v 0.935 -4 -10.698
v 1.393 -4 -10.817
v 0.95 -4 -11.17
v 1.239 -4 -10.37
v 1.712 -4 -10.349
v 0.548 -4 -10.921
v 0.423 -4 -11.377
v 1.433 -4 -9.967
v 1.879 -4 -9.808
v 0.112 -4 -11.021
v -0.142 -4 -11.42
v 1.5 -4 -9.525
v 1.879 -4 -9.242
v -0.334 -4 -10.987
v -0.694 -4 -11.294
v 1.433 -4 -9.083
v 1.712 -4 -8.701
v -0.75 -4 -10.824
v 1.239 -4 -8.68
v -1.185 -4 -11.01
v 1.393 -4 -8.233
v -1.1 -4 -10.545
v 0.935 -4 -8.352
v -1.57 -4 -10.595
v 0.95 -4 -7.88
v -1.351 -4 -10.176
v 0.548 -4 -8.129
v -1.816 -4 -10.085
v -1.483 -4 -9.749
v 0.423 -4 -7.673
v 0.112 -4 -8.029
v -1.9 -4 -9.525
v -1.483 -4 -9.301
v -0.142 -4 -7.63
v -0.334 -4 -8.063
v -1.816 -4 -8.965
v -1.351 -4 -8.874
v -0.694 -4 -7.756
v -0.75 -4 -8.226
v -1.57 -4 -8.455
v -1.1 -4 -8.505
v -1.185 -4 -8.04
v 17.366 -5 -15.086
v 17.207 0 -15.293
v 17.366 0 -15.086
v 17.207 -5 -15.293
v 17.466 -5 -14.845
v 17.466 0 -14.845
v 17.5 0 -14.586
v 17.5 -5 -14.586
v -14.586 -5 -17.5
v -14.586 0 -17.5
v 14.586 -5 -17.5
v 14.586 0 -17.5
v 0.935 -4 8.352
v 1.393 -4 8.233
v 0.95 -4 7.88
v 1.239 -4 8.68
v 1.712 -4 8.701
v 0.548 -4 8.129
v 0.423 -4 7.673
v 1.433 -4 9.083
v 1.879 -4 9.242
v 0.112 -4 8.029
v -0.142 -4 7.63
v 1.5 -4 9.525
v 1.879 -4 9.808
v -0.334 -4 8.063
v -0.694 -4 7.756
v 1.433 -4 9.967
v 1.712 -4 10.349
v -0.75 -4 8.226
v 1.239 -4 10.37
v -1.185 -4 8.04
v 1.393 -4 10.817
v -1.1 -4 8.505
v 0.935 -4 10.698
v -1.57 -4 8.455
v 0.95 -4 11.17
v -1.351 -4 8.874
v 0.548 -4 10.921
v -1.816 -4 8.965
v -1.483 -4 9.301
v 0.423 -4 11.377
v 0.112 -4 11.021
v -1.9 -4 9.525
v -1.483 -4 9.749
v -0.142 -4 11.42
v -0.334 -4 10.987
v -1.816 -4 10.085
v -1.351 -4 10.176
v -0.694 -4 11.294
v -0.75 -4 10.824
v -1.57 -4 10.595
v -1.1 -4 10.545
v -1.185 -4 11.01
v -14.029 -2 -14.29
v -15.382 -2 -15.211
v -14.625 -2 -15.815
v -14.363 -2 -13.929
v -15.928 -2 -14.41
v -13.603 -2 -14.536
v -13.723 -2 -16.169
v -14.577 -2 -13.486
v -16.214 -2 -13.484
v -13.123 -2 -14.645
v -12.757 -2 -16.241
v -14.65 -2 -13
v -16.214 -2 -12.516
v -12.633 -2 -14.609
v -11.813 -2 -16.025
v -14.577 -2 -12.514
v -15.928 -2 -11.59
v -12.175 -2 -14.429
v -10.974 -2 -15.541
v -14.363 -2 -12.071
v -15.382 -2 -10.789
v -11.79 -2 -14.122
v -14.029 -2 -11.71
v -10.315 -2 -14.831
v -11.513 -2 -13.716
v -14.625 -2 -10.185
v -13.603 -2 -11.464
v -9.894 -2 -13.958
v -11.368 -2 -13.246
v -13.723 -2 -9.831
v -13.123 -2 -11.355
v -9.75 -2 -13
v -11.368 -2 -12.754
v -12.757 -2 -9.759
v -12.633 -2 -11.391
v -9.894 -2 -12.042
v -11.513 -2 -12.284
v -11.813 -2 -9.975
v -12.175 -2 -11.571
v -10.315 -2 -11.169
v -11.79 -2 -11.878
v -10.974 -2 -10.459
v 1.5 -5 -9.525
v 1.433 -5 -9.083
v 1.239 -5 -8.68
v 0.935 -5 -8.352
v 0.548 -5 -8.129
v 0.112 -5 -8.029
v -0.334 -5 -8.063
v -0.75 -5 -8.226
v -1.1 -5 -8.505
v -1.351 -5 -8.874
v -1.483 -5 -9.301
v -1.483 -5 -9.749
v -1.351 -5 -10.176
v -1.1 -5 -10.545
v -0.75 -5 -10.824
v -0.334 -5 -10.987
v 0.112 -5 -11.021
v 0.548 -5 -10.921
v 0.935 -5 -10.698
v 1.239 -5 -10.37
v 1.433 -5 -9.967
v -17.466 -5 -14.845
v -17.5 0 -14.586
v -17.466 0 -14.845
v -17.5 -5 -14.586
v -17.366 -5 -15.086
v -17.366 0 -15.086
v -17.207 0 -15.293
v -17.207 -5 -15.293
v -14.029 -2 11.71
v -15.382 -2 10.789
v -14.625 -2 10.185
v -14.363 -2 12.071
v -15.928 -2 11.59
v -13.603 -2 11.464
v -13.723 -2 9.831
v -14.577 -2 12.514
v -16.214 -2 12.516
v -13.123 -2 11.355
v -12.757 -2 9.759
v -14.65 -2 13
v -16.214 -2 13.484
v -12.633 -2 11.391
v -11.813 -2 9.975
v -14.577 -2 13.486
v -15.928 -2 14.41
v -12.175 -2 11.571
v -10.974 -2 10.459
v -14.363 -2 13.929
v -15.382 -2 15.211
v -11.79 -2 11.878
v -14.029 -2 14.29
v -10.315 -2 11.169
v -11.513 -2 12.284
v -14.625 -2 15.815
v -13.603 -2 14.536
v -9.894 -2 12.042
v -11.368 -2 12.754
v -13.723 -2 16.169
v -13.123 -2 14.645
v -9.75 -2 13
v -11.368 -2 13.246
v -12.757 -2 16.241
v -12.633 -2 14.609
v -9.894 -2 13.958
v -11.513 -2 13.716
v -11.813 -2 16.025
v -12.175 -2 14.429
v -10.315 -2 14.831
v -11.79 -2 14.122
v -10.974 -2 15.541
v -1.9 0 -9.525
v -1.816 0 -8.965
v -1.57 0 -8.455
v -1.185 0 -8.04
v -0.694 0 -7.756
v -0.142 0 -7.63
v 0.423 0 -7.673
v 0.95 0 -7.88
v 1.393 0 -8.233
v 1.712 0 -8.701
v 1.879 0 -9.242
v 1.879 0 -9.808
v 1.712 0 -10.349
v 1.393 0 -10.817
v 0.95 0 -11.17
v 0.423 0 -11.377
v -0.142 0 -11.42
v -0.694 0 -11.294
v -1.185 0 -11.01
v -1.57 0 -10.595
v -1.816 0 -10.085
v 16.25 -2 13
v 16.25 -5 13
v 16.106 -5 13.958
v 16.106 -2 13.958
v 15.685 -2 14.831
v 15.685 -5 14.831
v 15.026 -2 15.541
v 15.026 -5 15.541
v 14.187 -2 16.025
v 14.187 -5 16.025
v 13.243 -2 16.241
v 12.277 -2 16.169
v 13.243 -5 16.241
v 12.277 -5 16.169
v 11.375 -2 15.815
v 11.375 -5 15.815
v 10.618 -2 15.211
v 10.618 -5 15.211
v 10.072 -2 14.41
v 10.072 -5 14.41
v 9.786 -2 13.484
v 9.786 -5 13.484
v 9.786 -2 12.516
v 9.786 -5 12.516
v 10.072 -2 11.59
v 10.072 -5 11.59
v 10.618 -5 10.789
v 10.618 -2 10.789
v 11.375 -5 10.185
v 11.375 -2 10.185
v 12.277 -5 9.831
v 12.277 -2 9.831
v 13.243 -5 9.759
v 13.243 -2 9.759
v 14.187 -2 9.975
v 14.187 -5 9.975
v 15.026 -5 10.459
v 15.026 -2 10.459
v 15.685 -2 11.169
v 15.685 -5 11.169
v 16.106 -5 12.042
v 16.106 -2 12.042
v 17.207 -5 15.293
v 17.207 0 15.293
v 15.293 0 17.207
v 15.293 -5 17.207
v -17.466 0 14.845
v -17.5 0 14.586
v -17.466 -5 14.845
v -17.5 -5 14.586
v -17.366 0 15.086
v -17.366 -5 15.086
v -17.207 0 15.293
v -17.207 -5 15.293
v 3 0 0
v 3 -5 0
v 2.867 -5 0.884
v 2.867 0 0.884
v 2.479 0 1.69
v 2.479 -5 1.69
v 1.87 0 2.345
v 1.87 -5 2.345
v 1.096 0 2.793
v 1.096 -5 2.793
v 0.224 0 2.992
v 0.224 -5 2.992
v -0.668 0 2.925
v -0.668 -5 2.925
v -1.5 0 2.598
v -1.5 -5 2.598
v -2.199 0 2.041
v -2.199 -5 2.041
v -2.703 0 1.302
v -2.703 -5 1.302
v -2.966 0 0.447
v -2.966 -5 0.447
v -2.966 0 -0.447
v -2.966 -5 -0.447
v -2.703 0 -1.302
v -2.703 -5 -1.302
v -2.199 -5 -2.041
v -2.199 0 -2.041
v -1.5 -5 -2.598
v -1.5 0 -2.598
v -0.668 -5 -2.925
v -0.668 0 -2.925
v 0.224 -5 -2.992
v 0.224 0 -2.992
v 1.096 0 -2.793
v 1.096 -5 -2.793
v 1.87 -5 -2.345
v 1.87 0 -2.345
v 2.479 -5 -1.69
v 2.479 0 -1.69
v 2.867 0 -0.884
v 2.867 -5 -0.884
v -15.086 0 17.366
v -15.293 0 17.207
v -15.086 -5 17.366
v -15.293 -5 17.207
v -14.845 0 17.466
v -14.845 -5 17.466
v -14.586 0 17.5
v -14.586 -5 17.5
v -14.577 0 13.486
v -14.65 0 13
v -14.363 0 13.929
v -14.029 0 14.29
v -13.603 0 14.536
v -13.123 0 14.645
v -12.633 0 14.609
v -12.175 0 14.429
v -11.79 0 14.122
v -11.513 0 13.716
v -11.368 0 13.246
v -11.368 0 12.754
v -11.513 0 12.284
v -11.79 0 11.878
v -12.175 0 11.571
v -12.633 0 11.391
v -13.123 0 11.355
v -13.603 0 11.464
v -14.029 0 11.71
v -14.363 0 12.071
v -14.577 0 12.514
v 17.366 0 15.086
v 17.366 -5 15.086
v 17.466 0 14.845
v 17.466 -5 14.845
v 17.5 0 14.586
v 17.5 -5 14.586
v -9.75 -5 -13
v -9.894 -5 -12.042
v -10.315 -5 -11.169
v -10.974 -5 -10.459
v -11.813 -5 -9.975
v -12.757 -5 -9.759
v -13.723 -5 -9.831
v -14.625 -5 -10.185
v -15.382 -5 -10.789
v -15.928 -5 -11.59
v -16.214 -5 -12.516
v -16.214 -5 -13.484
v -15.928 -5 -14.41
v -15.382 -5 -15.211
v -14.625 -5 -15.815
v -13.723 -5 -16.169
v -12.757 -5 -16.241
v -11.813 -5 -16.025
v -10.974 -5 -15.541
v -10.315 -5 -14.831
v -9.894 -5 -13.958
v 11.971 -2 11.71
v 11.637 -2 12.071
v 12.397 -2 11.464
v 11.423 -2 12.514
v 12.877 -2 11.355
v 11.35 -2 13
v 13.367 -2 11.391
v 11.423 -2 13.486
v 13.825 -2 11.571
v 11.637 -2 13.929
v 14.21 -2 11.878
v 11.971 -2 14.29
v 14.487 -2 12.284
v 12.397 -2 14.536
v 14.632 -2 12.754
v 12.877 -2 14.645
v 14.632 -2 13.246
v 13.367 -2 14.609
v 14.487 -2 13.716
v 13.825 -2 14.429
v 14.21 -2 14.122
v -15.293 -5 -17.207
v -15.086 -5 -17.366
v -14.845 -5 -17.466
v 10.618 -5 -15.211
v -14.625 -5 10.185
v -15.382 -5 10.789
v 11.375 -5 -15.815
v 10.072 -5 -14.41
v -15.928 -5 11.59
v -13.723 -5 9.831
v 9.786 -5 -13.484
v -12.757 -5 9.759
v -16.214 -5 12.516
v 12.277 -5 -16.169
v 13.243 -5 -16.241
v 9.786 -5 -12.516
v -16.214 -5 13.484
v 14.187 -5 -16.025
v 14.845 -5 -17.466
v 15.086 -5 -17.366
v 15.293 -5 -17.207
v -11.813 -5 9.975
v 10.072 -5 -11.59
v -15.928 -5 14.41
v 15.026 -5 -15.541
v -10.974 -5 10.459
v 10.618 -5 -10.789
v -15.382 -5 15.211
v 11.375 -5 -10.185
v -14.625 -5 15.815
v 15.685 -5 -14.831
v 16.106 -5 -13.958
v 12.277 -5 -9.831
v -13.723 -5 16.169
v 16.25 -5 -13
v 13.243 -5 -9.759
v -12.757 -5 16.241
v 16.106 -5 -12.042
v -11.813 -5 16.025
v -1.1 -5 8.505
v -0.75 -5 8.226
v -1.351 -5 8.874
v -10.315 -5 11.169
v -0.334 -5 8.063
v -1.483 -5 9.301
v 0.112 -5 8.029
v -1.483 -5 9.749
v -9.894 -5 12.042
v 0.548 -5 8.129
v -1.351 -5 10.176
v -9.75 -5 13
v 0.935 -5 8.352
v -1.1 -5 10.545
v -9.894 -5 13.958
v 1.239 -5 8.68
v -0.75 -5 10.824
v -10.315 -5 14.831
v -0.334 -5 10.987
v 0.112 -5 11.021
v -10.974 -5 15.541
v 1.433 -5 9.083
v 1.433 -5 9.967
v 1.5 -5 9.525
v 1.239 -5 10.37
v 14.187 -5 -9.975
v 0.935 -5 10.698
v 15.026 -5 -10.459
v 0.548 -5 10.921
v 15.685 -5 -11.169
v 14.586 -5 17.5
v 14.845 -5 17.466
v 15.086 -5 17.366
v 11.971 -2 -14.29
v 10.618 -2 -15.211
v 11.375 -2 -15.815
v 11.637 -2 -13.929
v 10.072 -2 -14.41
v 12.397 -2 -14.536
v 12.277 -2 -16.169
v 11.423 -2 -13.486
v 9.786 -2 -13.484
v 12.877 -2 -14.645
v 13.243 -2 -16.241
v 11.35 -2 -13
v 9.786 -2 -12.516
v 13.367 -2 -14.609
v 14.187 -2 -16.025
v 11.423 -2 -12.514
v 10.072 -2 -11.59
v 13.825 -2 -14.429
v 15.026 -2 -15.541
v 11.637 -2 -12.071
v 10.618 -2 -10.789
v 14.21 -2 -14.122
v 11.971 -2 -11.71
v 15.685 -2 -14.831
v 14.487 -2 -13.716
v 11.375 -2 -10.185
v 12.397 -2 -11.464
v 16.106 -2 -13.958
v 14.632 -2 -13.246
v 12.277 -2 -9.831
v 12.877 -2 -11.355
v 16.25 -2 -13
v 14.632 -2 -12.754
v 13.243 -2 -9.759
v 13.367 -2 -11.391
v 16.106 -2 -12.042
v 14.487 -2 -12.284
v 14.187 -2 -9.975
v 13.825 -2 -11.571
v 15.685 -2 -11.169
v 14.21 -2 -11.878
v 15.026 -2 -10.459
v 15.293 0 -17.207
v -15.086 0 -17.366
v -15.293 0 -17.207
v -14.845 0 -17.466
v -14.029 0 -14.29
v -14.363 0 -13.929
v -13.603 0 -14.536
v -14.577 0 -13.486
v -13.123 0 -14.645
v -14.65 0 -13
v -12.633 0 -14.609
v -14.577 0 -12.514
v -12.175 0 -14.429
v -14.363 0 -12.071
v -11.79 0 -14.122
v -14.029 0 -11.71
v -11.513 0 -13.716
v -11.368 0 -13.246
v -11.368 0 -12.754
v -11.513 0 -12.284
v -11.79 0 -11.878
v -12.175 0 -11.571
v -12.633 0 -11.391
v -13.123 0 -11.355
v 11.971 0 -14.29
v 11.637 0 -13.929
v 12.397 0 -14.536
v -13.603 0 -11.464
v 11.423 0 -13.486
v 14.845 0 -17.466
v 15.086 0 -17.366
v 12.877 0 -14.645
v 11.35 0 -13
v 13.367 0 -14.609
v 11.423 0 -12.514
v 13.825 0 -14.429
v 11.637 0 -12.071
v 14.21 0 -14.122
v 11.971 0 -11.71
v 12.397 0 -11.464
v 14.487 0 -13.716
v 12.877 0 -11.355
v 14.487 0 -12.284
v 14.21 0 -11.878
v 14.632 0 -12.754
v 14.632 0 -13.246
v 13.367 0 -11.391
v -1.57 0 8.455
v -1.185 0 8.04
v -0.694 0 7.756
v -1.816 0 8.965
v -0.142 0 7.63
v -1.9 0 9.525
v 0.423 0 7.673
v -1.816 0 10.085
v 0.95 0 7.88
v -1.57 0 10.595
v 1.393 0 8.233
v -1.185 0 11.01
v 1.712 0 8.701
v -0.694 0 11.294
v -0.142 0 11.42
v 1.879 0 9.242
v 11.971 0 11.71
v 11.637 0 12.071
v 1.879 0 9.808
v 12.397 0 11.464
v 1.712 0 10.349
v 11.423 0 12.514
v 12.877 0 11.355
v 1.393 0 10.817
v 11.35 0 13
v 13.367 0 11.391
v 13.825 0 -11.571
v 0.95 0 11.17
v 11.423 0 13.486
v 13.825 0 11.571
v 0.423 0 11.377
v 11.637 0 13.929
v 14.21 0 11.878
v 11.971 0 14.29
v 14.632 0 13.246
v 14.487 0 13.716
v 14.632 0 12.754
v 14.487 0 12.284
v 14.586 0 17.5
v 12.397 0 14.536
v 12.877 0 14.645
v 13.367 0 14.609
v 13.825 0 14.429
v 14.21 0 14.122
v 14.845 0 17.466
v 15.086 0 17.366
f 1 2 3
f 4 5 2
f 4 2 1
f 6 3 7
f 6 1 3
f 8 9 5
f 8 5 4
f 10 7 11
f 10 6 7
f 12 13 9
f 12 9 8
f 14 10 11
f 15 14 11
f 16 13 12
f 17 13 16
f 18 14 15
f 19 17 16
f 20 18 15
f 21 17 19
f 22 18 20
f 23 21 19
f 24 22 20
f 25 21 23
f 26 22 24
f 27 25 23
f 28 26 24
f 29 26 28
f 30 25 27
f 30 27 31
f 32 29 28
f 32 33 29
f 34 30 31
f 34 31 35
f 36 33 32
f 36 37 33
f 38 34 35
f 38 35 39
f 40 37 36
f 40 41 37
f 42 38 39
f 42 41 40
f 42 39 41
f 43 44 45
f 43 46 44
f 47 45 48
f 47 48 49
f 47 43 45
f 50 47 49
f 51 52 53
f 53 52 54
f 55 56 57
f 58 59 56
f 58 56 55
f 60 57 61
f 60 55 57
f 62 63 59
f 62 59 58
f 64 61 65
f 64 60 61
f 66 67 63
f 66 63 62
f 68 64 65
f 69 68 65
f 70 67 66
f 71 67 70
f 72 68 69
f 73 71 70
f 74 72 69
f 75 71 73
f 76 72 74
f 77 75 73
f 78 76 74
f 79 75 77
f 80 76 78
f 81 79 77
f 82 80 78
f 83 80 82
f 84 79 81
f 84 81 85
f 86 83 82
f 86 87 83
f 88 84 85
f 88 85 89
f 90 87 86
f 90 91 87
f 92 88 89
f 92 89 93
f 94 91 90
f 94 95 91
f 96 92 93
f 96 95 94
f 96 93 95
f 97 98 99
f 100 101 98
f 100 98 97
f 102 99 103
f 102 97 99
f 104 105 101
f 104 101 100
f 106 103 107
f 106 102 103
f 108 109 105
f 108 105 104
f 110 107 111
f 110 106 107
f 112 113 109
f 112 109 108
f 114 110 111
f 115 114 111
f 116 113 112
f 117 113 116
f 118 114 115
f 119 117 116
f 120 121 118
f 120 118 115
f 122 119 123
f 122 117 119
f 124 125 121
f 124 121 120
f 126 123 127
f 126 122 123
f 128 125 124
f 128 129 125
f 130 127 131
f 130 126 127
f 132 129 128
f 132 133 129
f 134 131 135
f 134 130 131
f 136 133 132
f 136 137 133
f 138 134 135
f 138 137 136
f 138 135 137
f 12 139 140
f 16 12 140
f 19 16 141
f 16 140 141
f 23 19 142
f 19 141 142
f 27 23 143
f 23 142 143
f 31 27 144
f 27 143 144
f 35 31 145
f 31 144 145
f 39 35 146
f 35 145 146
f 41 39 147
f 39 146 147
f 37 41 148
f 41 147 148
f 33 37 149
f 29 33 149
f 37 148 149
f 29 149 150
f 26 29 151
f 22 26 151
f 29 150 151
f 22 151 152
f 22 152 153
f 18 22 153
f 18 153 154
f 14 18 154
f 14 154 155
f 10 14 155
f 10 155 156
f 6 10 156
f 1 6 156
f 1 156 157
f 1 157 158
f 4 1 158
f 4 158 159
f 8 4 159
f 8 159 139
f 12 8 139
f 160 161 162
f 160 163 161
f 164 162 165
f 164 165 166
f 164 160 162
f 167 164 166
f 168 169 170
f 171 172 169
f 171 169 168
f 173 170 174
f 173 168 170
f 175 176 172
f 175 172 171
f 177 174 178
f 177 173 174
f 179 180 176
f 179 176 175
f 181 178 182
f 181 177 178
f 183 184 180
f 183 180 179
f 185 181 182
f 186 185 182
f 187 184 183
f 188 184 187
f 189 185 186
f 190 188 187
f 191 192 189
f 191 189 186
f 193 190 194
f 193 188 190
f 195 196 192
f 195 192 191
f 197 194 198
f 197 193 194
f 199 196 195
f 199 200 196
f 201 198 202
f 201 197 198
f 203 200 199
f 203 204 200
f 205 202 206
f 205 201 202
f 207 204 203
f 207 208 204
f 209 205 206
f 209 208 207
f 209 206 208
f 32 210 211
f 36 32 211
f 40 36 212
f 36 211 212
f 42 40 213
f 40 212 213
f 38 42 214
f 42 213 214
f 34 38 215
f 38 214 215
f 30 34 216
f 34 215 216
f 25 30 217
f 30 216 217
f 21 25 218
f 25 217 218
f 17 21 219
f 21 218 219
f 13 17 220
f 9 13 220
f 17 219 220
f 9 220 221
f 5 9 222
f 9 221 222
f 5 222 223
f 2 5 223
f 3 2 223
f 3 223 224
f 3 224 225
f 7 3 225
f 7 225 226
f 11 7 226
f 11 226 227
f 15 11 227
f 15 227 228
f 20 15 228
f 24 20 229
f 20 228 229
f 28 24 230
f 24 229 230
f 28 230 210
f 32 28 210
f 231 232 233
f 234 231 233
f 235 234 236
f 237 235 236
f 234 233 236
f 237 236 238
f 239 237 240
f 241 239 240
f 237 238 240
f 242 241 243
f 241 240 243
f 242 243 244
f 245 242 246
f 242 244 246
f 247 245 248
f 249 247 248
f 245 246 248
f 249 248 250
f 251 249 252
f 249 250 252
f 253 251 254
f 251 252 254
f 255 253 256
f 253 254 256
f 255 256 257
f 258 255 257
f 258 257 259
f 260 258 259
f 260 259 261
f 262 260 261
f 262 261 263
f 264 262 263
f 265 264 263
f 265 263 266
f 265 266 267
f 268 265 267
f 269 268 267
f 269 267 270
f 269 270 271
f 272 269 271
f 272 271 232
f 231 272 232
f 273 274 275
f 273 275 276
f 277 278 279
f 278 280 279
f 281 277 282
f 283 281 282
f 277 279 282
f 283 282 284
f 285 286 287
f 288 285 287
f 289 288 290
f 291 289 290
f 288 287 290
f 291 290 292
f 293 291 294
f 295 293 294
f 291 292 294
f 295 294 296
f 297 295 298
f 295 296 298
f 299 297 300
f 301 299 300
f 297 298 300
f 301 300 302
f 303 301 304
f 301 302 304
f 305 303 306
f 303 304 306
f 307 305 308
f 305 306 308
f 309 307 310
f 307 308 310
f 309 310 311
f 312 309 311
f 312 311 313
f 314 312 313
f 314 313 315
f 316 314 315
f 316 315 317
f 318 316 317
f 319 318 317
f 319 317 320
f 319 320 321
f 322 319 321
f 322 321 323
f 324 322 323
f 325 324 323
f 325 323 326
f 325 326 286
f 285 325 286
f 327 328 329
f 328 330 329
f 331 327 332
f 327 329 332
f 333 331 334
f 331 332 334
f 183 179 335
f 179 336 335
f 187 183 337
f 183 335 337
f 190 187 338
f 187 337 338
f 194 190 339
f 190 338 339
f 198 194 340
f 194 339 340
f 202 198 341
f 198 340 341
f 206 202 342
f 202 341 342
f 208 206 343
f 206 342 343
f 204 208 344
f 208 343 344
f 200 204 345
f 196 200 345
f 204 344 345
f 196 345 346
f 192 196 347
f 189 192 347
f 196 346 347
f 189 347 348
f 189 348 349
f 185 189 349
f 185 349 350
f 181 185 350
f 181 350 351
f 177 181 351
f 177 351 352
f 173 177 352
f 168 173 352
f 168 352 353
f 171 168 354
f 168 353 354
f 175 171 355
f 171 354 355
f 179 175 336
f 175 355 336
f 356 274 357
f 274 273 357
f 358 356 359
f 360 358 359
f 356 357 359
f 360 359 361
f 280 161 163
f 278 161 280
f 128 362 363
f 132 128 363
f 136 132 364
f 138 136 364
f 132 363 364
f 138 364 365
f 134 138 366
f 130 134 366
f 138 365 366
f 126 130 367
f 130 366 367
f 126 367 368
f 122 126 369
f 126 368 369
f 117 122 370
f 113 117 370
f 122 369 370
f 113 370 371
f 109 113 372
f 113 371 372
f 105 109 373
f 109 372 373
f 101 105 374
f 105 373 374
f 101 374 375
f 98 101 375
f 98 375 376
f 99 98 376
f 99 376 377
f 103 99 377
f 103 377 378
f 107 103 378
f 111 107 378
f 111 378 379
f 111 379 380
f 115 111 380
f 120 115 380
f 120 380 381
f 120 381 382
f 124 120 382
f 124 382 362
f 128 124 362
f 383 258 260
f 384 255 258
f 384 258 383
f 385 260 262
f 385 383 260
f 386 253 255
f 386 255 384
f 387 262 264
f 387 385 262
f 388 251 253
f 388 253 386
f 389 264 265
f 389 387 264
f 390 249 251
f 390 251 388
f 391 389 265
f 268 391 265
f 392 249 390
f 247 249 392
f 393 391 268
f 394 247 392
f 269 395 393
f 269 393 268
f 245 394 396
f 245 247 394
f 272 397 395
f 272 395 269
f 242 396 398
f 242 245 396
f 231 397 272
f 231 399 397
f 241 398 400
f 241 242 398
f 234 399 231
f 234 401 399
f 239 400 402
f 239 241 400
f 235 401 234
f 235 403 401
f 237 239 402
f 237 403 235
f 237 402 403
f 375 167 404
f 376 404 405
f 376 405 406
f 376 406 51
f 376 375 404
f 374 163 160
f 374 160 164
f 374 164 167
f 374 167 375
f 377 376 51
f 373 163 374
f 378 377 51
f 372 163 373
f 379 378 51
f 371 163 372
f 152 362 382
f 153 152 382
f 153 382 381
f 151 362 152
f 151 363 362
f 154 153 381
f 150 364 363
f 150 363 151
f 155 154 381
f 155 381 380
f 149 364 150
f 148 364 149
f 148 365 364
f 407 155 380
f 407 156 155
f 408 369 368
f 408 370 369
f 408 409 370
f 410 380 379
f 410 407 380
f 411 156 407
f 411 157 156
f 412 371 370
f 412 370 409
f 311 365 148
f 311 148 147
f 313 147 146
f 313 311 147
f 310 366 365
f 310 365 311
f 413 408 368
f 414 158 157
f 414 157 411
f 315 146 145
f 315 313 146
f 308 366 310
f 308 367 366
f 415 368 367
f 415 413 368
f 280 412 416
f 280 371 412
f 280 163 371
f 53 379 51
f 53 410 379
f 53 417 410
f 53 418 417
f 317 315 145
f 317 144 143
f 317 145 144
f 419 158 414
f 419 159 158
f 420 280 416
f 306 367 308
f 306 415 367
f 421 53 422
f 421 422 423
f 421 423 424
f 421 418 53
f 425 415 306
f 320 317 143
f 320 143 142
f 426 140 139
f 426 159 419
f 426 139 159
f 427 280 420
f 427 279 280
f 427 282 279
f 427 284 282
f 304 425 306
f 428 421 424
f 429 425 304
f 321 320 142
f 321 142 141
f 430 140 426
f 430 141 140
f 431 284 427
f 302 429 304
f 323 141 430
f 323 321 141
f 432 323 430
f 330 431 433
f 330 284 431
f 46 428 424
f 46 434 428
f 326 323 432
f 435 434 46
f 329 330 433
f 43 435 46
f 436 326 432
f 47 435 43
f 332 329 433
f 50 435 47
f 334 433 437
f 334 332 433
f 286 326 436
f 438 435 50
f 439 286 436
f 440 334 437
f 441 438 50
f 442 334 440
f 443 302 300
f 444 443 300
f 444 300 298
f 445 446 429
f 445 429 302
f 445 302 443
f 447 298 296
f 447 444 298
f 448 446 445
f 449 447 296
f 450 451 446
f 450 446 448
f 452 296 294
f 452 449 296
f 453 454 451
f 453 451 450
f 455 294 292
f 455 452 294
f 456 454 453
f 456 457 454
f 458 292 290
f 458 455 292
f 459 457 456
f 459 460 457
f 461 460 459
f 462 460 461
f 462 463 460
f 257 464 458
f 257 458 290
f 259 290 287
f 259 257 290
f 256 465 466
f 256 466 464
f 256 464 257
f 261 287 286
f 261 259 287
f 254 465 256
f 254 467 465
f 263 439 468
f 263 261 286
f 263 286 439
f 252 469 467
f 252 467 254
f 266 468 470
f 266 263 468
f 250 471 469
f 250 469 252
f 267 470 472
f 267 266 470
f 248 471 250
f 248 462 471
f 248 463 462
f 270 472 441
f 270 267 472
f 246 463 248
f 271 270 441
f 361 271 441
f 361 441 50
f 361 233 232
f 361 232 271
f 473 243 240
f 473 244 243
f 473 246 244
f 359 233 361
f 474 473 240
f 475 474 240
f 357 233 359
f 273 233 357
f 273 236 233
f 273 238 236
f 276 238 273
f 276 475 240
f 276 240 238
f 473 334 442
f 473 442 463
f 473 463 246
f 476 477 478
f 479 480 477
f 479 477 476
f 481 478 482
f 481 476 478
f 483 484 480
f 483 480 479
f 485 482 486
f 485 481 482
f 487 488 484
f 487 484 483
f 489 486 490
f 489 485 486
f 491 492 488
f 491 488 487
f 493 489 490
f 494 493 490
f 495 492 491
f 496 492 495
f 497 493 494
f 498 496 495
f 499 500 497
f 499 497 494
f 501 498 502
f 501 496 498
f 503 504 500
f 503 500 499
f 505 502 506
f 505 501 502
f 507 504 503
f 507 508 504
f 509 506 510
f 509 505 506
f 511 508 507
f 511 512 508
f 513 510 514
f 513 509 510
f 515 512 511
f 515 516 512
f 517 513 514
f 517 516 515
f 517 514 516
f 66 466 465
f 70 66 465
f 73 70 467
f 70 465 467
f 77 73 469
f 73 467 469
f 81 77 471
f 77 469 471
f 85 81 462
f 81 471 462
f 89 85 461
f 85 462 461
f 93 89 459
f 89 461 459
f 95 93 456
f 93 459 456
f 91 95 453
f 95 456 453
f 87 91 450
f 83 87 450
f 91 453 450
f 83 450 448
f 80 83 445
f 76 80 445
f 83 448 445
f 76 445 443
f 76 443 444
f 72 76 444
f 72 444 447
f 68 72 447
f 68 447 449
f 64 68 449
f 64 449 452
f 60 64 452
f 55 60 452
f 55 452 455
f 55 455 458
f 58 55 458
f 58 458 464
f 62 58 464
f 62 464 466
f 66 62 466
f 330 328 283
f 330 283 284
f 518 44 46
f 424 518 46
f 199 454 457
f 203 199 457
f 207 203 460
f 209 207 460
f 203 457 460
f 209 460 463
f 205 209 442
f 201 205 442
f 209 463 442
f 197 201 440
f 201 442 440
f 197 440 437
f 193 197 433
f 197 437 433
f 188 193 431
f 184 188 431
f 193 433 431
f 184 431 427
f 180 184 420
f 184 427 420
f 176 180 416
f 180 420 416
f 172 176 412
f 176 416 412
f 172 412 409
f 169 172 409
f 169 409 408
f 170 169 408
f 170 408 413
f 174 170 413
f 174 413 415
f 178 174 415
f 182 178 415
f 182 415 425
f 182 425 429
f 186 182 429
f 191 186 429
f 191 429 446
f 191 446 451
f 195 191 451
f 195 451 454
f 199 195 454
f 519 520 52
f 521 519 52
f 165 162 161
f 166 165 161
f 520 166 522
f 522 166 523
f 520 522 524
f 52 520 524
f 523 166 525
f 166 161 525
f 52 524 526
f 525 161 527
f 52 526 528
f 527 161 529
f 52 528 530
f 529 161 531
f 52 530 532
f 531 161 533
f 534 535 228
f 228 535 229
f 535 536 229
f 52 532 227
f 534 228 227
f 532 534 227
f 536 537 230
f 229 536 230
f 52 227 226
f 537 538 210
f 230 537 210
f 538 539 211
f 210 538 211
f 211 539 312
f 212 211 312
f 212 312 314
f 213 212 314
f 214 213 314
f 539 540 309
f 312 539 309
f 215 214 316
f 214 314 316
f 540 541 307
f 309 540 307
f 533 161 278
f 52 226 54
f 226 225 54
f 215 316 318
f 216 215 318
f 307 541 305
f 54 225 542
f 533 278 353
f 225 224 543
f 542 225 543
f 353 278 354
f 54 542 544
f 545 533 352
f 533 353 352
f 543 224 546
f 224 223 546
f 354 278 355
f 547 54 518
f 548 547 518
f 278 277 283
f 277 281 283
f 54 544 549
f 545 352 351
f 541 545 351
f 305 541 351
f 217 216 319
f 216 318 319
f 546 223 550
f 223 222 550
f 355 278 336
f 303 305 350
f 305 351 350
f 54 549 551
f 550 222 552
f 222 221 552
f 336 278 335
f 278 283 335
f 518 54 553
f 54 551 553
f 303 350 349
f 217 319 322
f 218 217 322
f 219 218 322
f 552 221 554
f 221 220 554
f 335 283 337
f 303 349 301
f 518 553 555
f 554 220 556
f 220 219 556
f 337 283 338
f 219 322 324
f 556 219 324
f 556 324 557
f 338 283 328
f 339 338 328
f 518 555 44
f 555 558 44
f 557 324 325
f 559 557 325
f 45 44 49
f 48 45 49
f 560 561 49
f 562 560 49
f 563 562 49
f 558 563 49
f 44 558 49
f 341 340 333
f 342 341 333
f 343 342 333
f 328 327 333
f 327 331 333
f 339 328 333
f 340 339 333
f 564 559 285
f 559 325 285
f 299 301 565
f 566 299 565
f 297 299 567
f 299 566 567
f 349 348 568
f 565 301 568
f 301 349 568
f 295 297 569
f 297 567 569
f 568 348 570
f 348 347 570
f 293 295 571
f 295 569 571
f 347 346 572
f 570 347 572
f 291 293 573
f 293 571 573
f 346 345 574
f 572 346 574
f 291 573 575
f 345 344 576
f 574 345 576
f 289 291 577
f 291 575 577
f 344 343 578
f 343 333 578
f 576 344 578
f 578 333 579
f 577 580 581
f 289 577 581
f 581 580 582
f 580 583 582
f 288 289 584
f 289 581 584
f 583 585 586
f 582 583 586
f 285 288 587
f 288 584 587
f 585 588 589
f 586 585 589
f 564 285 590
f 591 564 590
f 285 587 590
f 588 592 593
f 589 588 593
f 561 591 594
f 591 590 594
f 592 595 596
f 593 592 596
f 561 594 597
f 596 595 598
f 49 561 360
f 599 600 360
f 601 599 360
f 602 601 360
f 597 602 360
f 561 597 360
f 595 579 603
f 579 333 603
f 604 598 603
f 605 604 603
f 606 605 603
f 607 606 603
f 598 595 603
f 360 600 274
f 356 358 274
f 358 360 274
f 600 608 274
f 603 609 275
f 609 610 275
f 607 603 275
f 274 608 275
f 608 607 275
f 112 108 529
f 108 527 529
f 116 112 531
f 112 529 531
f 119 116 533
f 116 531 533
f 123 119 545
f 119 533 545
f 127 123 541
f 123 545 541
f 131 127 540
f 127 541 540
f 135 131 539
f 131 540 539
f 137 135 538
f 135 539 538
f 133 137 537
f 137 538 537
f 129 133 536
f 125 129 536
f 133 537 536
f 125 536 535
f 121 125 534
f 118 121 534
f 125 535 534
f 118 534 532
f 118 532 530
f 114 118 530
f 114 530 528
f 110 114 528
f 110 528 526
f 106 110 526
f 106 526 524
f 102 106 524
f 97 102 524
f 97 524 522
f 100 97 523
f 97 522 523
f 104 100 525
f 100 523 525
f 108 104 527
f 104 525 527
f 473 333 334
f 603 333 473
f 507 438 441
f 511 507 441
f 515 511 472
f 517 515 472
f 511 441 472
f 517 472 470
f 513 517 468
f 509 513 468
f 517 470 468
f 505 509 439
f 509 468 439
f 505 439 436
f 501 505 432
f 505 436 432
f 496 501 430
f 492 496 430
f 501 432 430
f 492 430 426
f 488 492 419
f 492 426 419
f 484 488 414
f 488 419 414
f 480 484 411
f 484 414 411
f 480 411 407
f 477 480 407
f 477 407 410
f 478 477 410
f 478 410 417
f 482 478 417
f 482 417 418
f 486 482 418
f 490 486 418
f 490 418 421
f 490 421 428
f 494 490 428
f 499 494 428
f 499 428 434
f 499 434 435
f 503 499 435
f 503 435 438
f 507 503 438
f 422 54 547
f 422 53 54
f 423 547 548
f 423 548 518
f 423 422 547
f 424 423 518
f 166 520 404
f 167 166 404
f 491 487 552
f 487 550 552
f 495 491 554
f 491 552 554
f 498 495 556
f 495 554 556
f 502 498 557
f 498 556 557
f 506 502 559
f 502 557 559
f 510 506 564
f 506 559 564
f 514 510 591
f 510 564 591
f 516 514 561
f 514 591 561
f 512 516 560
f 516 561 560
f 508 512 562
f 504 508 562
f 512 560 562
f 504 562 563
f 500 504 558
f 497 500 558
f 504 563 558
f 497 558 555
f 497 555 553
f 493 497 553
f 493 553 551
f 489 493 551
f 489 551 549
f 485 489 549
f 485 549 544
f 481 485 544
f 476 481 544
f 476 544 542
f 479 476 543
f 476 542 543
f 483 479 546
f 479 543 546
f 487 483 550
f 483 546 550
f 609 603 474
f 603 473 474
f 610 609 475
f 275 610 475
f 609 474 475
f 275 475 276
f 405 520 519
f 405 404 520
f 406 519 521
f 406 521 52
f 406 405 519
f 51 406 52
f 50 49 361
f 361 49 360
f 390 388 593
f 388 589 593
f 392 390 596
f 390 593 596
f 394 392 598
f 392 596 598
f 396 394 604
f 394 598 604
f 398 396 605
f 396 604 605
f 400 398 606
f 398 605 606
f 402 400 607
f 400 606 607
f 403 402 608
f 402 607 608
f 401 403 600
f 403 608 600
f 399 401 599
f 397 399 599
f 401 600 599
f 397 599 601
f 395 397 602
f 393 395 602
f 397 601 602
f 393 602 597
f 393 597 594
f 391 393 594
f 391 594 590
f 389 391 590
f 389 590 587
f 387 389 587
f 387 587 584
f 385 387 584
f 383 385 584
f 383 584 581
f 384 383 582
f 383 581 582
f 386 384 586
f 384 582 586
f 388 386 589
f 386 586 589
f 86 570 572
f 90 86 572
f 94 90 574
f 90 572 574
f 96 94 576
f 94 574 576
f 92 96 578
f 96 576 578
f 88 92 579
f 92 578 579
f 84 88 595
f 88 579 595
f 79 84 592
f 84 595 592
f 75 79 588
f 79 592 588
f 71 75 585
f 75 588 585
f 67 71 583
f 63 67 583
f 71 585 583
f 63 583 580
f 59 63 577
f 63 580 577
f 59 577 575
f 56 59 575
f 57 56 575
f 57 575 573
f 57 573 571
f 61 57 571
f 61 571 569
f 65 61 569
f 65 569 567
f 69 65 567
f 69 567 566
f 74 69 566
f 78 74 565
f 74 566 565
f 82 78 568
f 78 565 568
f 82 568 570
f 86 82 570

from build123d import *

# Parameters (mm, degrees)
F0_W           = 35
F0_H           = 35
F1_DEPTH       = 5
F2_R           = 3
F3_DEPTH       = 5.001
F5_D           = 3.3
F5_CBORE_D     = 6.5
F5_CBORE_DEPTH = 3
F6_SIZE        = 2.5
F7_R           = 1
F8_R           = 1.5
F9_DEPTH       = 5.001
F10_R          = 1.9
F11_DEPTH      = 4


with BuildPart() as f1:
    # F0 (on Front) → F1 (new body)
    with BuildSketch(Plane.XZ):
        Rectangle(F0_W, F0_H)
    extrude(amount=F1_DEPTH)

    # F2 (on face) → F3 (cut, through all)
    with BuildSketch(Plane.XZ.offset(5)):
        Circle(F2_R)
    extrude(amount=-F3_DEPTH, mode=Mode.SUBTRACT)

    # F5 (through all)
    with Locations(Plane.XZ.offset(5)):
        with Locations((-13, 13), (13, 13), (13, -13), (-13, -13)):
            CounterBoreHole(F5_D / 2, F5_CBORE_D / 2, F5_CBORE_DEPTH)

    # F6
    f6_edges = [f1.edges().sort_by_distance(p)[0] for p in [
        (17.5, -2.5, 17.5),
        (-17.5, -2.5, 17.5),
        (17.5, -2.5, -17.5),
        (-17.5, -2.5, -17.5),
    ]]
    chamfer(f6_edges, length=F6_SIZE)

    # F7
    f7_edges = [f1.edges().sort_by_distance(p)[0] for p in [
        (15, -2.5, 17.5),
        (17.5, -2.5, 15),
        (17.5, -2.5, -15),
        (15, -2.5, -17.5),
        (-15, -2.5, -17.5),
        (-17.5, -2.5, -15),
        (-15, -2.5, 17.5),
        (-17.5, -2.5, 15),
    ]]
    fillet(f7_edges, radius=F7_R)

    # F8 (on face) → F9 (cut, through all)
    with BuildSketch(Plane.XZ.offset(5)):
        with Locations((0, 9.525)):
            Circle(F8_R)
        with Locations((0, -9.525)):
            Circle(F8_R)
    extrude(amount=-F9_DEPTH, mode=Mode.SUBTRACT)

    # F10 (on face) → F11 (cut)
    with BuildSketch(Plane(origin=(0, 0, 0), x_dir=(-1, 0, 0), z_dir=(0, 1, 0))):
        with Locations((0, -9.525)):
            Circle(F10_R)
        with Locations((0, 9.525)):
            Circle(F10_R)
    extrude(amount=-F11_DEPTH, mode=Mode.SUBTRACT)


solid = f1.part
